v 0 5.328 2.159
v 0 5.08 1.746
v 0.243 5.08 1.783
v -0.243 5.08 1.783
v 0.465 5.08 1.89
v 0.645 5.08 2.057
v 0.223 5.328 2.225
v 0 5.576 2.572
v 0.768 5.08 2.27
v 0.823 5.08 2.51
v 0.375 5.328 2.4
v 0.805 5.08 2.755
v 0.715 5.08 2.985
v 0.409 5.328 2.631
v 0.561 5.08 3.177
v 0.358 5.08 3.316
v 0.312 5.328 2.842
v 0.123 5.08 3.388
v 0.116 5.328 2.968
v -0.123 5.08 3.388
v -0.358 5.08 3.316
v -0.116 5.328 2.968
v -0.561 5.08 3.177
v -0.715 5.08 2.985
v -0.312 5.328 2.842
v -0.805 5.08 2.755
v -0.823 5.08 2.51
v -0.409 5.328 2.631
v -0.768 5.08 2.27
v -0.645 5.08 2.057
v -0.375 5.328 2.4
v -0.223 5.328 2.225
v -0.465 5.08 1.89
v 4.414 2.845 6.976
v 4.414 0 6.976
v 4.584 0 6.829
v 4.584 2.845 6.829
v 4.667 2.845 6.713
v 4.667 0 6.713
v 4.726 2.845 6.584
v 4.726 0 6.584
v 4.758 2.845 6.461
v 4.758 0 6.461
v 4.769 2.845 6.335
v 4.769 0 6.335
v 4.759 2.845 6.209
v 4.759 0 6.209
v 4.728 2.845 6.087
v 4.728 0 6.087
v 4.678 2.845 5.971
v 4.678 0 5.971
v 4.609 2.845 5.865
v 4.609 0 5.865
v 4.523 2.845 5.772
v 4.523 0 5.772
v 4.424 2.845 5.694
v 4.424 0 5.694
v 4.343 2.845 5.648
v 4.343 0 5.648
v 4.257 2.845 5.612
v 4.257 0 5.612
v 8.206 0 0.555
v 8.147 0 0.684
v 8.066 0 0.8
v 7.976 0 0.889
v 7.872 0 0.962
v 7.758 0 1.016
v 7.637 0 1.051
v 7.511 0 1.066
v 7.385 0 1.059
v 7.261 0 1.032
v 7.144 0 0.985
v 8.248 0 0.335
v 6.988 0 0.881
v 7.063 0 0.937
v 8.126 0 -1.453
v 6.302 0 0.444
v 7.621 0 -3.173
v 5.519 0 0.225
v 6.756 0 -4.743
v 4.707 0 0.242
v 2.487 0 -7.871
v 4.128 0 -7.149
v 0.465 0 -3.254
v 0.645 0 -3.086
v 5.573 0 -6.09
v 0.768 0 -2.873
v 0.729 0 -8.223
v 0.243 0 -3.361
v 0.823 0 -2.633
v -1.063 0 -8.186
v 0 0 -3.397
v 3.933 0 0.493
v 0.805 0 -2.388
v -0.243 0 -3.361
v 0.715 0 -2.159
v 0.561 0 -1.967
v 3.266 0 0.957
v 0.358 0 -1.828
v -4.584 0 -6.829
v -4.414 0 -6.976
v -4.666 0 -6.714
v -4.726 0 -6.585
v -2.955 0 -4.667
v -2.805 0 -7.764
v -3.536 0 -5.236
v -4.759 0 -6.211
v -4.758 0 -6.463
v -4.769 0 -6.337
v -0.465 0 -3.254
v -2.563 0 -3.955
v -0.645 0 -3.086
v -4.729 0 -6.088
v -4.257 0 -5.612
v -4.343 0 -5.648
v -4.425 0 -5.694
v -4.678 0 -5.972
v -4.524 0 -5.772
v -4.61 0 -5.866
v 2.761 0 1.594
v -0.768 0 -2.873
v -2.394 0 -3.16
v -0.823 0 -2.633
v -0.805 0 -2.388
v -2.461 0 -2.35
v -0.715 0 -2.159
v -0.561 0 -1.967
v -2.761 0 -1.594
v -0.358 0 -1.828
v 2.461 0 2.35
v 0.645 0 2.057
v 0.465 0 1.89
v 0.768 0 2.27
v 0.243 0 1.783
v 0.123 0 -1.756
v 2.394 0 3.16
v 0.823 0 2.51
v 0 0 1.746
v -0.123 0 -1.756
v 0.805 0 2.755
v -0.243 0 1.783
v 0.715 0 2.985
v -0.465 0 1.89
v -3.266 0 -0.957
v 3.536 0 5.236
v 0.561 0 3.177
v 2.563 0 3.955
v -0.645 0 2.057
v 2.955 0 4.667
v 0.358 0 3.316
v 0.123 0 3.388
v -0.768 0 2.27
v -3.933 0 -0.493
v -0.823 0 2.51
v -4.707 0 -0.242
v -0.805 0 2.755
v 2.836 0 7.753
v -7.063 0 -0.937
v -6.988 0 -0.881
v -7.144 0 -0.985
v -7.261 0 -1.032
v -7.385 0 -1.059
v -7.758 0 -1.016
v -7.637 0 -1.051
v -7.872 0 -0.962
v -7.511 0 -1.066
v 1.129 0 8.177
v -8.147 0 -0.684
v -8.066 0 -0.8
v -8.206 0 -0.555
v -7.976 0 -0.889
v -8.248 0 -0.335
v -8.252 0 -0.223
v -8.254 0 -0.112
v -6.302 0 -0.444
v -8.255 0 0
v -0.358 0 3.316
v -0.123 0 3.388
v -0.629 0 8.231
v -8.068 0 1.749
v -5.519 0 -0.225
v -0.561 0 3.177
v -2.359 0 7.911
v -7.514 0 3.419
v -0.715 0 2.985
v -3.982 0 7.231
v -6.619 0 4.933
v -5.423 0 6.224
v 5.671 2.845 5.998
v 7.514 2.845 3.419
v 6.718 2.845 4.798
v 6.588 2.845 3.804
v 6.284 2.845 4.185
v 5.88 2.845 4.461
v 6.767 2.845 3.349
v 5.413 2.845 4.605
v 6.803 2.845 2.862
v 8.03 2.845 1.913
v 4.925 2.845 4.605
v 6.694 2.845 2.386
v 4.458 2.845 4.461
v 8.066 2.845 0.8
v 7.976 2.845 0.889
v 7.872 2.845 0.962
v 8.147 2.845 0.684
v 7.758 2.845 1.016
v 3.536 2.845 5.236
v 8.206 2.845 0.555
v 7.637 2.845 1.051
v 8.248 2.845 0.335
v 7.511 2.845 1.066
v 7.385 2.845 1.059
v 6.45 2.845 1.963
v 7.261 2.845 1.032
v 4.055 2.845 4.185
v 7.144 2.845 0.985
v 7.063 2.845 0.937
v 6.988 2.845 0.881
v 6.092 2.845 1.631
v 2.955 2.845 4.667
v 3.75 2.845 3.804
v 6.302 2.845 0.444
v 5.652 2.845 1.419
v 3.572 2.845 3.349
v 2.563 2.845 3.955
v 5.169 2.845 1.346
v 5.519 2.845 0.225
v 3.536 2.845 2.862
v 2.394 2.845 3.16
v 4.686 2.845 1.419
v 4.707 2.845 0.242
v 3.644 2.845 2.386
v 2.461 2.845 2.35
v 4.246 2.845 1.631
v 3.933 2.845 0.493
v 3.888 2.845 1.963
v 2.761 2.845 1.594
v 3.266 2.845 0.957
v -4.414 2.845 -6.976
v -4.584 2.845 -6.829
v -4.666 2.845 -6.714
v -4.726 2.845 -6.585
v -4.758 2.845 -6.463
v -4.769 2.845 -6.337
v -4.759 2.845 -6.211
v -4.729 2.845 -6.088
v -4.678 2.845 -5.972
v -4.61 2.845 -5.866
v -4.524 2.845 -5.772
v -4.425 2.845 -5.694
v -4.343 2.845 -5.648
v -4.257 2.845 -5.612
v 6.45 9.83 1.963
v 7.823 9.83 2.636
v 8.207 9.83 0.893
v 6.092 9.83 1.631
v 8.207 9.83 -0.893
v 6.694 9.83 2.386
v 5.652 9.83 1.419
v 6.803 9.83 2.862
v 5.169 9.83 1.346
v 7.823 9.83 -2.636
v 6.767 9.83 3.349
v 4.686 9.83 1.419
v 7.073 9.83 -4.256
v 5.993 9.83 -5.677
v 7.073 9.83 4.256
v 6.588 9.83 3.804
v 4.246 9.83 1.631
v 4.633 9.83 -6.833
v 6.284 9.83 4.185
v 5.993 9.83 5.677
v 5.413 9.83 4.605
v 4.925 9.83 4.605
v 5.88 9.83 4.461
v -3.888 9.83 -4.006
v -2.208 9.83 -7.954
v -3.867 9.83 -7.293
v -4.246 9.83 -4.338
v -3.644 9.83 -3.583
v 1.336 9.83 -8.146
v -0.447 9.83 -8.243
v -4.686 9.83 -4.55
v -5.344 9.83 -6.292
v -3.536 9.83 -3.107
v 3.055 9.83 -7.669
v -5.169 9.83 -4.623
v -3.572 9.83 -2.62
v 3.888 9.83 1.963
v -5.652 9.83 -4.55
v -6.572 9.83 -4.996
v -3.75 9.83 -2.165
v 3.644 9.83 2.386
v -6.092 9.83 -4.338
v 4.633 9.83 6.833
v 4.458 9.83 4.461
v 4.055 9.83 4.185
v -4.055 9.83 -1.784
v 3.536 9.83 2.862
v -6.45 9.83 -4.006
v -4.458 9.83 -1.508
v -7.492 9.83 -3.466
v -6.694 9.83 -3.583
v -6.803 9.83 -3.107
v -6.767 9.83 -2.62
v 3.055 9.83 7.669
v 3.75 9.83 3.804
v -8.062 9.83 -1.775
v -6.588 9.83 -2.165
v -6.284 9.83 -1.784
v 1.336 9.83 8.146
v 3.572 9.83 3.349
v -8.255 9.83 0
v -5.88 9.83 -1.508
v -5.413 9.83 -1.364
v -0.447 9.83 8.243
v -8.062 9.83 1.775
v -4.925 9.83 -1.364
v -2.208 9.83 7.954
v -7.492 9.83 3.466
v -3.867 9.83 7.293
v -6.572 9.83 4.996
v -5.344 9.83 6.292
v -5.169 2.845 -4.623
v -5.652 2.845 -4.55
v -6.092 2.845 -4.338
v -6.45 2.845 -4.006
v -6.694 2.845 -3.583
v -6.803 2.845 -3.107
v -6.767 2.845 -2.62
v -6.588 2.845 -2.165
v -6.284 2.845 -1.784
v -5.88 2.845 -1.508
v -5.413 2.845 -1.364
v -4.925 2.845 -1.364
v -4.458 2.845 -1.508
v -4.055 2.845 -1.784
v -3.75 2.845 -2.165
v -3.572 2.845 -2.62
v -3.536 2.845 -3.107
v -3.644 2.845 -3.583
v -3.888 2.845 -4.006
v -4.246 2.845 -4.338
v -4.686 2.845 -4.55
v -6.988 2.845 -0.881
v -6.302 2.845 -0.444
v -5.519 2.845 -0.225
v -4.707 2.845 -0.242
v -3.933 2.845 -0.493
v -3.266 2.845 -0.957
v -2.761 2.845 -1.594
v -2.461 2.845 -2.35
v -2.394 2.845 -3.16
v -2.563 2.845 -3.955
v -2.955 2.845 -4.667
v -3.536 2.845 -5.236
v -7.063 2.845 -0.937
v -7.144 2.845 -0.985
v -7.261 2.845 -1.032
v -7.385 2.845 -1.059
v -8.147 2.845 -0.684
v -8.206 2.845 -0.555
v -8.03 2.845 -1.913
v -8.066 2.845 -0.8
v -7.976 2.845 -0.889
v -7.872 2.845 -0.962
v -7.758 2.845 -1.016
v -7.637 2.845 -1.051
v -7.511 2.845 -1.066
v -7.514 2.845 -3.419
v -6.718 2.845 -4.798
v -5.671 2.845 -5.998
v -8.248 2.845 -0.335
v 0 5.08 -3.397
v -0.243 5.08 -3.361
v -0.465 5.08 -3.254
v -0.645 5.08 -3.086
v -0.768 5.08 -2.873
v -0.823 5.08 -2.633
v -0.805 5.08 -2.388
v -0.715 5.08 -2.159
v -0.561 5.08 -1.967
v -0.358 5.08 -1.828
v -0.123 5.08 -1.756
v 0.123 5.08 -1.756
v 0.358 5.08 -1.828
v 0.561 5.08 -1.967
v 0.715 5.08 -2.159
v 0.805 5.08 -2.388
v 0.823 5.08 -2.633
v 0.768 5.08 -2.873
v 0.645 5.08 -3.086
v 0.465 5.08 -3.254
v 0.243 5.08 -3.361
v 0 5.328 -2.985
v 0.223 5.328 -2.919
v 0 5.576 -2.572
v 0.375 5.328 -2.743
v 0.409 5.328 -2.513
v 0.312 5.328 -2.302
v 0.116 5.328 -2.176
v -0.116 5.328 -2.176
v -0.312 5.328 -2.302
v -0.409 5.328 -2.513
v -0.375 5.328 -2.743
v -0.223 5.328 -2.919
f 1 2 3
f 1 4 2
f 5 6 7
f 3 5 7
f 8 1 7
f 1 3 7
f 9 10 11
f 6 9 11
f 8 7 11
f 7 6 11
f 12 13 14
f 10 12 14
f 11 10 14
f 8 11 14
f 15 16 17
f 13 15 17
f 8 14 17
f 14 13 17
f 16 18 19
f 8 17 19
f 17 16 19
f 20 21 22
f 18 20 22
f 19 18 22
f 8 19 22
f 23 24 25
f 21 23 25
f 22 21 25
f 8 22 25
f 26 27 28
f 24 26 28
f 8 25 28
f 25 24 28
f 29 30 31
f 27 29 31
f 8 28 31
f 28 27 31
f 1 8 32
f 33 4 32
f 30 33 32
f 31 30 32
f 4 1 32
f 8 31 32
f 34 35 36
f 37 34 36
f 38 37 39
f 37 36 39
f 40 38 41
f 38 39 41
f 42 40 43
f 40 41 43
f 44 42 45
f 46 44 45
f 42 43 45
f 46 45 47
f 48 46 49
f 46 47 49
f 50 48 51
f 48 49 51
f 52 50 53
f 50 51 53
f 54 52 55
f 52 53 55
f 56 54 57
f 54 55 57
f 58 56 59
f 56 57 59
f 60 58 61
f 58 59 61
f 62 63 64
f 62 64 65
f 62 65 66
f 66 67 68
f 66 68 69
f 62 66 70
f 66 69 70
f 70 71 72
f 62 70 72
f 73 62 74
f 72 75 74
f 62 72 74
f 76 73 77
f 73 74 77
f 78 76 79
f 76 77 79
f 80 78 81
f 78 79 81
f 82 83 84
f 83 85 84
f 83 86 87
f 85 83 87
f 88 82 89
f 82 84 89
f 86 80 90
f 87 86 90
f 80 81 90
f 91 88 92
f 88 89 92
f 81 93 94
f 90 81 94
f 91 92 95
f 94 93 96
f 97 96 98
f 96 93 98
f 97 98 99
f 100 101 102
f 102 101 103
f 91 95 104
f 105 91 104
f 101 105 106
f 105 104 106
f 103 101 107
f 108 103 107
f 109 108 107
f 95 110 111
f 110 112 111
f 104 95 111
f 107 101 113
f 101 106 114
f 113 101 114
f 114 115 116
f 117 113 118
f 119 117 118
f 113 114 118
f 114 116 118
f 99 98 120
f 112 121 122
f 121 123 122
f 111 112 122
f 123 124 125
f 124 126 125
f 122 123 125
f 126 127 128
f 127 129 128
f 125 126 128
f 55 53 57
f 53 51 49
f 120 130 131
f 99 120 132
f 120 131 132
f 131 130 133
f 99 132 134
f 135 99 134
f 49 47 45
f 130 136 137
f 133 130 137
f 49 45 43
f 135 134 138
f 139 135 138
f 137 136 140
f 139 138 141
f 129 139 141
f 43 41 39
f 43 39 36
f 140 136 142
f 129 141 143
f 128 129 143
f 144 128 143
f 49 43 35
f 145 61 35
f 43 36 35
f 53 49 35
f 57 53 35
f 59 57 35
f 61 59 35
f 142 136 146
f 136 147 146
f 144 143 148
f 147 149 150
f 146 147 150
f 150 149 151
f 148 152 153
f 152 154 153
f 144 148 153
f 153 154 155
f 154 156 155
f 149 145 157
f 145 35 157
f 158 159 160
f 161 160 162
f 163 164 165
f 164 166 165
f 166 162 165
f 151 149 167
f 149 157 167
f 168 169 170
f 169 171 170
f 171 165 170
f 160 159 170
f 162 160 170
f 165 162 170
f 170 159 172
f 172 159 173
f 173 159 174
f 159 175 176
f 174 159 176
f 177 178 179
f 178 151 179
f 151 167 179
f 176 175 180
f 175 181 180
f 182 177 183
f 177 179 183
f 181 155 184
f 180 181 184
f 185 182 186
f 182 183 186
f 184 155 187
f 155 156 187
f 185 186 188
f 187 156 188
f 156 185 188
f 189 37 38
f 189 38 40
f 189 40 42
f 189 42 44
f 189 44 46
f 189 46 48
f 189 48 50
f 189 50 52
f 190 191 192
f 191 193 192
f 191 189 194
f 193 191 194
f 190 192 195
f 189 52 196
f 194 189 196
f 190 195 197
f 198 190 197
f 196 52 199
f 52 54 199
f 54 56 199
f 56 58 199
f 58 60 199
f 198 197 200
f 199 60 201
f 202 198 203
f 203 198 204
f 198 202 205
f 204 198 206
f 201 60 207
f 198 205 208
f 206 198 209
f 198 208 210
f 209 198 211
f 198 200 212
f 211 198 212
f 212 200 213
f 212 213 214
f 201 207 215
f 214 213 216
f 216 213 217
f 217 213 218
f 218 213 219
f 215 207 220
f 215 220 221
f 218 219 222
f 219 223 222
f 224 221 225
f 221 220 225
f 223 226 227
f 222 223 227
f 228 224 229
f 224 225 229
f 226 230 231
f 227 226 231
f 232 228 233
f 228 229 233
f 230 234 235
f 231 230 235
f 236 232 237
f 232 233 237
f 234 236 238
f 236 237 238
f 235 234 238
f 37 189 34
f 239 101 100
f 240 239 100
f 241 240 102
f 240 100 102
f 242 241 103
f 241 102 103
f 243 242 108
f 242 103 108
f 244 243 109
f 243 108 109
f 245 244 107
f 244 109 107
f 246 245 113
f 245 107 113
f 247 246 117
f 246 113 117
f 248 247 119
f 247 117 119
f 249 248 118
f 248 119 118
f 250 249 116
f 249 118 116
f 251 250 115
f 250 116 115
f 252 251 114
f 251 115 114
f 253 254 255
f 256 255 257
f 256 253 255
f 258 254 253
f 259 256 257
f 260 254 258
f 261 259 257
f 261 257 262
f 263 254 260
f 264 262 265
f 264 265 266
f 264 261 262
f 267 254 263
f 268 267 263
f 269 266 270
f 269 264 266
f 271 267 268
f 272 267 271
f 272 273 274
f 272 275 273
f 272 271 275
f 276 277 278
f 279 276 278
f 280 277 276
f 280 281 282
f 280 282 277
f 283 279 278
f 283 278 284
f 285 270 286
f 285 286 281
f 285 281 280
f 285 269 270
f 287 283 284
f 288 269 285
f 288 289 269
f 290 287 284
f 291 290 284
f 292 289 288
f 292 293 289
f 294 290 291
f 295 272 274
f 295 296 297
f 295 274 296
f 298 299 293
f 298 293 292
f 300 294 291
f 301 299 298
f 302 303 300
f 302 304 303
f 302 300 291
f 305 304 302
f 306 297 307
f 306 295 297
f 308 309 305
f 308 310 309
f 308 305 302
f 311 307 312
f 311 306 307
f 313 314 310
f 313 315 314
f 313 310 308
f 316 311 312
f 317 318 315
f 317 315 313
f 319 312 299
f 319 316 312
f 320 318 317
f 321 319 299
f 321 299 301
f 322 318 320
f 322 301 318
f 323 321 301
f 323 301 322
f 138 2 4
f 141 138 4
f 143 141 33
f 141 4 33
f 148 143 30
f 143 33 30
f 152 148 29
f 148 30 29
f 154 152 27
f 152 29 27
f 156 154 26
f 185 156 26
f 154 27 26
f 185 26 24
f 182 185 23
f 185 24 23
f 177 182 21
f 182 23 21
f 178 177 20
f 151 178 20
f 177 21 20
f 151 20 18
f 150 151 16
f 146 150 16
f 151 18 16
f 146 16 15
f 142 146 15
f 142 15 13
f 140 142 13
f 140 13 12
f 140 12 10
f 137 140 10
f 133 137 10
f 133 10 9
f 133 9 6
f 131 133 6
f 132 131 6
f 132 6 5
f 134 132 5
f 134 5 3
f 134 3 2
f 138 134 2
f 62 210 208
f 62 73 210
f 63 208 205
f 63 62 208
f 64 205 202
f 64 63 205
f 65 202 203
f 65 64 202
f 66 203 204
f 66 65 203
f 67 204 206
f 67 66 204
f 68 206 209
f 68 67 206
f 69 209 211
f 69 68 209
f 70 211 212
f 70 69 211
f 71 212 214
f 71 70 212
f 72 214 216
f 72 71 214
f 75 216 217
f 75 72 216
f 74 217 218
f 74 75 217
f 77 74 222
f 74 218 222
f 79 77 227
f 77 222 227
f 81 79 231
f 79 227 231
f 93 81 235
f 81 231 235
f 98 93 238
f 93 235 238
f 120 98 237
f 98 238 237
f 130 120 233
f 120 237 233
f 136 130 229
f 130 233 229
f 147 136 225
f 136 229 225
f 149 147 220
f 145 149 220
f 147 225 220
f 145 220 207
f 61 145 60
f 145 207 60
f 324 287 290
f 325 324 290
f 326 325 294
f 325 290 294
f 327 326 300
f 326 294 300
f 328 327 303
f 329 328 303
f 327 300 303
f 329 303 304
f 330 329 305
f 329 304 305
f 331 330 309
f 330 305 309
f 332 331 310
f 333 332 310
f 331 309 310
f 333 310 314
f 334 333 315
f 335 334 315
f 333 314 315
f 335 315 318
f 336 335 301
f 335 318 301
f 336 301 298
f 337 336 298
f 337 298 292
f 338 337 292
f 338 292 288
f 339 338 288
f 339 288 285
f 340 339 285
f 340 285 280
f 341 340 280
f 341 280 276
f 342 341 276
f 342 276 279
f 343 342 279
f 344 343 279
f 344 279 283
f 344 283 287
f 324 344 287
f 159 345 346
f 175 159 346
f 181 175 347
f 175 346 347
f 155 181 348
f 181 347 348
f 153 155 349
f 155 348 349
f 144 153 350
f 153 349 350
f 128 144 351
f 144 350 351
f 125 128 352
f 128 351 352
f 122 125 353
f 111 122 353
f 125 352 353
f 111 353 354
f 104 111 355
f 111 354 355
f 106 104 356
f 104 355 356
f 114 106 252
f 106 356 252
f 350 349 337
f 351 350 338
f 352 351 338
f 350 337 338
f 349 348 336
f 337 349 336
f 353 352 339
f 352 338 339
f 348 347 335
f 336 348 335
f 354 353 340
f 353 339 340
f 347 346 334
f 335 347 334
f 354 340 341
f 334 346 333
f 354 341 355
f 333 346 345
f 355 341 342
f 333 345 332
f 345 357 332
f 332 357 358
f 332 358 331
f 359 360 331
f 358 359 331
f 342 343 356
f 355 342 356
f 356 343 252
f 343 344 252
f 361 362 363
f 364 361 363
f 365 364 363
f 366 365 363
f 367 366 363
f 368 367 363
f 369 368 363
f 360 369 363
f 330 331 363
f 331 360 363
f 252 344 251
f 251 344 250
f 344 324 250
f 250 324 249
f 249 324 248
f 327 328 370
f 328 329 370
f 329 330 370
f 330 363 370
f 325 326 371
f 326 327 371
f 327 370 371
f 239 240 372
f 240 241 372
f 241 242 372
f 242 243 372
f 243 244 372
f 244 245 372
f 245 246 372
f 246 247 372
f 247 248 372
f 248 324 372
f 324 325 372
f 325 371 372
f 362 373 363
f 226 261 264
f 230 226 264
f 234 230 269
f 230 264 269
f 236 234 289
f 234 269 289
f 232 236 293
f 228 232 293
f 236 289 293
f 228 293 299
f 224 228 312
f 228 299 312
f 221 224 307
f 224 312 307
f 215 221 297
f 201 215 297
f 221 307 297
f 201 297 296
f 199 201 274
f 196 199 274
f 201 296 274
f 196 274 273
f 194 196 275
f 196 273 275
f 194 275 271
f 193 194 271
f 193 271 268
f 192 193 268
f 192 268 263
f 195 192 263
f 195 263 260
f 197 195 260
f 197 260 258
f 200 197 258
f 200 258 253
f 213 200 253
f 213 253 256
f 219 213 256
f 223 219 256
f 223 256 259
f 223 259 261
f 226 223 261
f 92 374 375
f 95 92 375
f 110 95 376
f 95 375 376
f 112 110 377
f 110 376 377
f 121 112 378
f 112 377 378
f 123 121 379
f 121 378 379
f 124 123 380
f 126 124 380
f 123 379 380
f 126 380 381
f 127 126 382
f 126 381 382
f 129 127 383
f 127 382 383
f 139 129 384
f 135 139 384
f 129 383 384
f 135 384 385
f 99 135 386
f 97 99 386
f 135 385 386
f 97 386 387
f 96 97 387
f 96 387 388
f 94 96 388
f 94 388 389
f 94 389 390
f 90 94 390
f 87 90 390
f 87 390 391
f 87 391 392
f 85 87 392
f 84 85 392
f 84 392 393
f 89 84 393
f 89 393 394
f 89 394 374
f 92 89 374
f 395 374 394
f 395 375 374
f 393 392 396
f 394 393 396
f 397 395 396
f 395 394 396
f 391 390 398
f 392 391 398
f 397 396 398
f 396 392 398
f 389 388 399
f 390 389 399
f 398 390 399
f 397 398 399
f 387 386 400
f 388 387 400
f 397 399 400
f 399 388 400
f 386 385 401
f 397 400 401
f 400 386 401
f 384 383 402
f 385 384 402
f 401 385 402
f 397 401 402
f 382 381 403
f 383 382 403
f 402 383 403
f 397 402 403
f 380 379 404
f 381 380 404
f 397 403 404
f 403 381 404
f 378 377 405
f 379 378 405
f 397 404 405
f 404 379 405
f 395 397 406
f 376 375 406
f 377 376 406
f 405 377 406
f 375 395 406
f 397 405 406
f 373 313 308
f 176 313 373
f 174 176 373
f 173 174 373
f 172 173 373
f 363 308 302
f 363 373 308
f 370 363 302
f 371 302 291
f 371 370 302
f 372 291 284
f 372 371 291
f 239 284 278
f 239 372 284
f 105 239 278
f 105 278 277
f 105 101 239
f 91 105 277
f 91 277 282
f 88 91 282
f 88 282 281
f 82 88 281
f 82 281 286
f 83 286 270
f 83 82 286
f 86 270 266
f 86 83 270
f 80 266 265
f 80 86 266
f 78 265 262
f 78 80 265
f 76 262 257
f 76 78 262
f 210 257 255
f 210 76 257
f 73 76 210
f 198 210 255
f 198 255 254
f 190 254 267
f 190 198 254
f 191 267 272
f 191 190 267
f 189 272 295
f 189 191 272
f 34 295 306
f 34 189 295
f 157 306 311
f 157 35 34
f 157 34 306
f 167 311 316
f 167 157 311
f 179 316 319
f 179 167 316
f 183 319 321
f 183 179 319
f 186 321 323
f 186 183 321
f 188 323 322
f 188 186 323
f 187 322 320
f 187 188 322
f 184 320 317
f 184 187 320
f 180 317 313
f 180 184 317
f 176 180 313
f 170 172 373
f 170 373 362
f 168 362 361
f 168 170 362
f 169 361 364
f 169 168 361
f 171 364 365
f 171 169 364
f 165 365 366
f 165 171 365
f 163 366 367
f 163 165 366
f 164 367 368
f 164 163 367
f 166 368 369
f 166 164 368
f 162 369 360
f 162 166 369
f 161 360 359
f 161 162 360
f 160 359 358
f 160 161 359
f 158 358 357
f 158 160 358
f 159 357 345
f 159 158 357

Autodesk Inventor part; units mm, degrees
ref_plane "YZ Plane" through (0, 0, 0) normal (1, 0, 0) x (0, 1, 0)
ref_plane "XZ Plane" through (0, 0, 0) normal (0, 1, 0) x (-1, 0, 0)
ref_plane "XY Plane" through (0, 0, 0) normal (0, 0, 1) x (1, 0, 0)
sketch "Sketch1" plane through (0, 0, 0) normal (0, 1, 0) x (-1, 0, 0)
  circle A0 centre (0, 0) radius 8.255
  dimension "d0" = 16.51
extrude "Extrusion1" add sketch "Sketch1" along normal blind 9.8298
sketch "Sketch2" plane through (0, 0, 0) normal (0, -1, 0) x (1, 0, 0)
  line L0 (-5.1693, -2.9845) -> (5.1693, 2.9845) construction
  line L1 (-11.557, 0) -> (11.557, 0) projected
  point P0 (0, 0)
  dimension "d3" = 11.938
  dimension "d4" = 5.969
  dimension "d5" = 30
hole "Hole1" at (-5.1693, 0, -2.9845) at (5.1693, 0, 2.9845) direction (0, 1, 0) diameter 3.2766 end through all counterbore diameter 5.5626 counterbore depth 2.8448 clearance for "Socket Head Cap Screw" size "#4" standard "Ansi Unified Screw Threads"
fillet "Fillet1" radius 0.762 4 edges at (6.0414, 1.4224, 5.6255) (7.8926, 1.4224, 2.4192) (-6.0414, 1.4224, -5.6255) (-7.8926, 1.4224, -2.4192)
sketch "Sketch3" plane through (0, 0, 0) normal (0, -1, 0) x (1, 0, 0)
  point P0 (0, 0)
  point P1 (0, 2.5718)
  point P2 (0, -2.5718)
  dimension "d14" = 5.1435
  dimension "d15" = 2.5718
hole "Hole2" at (0, 0, 2.5718) at (0, 0, -2.5718) direction (0, 1, 0) diameter 1.651 depth 5.08 tip angle 118
equation "\"d4\" = 0.5 * d3"
equation "\"d15\" = 0.5 * d14"
properties part number "06WX5378 / 25.105.3101.00"
